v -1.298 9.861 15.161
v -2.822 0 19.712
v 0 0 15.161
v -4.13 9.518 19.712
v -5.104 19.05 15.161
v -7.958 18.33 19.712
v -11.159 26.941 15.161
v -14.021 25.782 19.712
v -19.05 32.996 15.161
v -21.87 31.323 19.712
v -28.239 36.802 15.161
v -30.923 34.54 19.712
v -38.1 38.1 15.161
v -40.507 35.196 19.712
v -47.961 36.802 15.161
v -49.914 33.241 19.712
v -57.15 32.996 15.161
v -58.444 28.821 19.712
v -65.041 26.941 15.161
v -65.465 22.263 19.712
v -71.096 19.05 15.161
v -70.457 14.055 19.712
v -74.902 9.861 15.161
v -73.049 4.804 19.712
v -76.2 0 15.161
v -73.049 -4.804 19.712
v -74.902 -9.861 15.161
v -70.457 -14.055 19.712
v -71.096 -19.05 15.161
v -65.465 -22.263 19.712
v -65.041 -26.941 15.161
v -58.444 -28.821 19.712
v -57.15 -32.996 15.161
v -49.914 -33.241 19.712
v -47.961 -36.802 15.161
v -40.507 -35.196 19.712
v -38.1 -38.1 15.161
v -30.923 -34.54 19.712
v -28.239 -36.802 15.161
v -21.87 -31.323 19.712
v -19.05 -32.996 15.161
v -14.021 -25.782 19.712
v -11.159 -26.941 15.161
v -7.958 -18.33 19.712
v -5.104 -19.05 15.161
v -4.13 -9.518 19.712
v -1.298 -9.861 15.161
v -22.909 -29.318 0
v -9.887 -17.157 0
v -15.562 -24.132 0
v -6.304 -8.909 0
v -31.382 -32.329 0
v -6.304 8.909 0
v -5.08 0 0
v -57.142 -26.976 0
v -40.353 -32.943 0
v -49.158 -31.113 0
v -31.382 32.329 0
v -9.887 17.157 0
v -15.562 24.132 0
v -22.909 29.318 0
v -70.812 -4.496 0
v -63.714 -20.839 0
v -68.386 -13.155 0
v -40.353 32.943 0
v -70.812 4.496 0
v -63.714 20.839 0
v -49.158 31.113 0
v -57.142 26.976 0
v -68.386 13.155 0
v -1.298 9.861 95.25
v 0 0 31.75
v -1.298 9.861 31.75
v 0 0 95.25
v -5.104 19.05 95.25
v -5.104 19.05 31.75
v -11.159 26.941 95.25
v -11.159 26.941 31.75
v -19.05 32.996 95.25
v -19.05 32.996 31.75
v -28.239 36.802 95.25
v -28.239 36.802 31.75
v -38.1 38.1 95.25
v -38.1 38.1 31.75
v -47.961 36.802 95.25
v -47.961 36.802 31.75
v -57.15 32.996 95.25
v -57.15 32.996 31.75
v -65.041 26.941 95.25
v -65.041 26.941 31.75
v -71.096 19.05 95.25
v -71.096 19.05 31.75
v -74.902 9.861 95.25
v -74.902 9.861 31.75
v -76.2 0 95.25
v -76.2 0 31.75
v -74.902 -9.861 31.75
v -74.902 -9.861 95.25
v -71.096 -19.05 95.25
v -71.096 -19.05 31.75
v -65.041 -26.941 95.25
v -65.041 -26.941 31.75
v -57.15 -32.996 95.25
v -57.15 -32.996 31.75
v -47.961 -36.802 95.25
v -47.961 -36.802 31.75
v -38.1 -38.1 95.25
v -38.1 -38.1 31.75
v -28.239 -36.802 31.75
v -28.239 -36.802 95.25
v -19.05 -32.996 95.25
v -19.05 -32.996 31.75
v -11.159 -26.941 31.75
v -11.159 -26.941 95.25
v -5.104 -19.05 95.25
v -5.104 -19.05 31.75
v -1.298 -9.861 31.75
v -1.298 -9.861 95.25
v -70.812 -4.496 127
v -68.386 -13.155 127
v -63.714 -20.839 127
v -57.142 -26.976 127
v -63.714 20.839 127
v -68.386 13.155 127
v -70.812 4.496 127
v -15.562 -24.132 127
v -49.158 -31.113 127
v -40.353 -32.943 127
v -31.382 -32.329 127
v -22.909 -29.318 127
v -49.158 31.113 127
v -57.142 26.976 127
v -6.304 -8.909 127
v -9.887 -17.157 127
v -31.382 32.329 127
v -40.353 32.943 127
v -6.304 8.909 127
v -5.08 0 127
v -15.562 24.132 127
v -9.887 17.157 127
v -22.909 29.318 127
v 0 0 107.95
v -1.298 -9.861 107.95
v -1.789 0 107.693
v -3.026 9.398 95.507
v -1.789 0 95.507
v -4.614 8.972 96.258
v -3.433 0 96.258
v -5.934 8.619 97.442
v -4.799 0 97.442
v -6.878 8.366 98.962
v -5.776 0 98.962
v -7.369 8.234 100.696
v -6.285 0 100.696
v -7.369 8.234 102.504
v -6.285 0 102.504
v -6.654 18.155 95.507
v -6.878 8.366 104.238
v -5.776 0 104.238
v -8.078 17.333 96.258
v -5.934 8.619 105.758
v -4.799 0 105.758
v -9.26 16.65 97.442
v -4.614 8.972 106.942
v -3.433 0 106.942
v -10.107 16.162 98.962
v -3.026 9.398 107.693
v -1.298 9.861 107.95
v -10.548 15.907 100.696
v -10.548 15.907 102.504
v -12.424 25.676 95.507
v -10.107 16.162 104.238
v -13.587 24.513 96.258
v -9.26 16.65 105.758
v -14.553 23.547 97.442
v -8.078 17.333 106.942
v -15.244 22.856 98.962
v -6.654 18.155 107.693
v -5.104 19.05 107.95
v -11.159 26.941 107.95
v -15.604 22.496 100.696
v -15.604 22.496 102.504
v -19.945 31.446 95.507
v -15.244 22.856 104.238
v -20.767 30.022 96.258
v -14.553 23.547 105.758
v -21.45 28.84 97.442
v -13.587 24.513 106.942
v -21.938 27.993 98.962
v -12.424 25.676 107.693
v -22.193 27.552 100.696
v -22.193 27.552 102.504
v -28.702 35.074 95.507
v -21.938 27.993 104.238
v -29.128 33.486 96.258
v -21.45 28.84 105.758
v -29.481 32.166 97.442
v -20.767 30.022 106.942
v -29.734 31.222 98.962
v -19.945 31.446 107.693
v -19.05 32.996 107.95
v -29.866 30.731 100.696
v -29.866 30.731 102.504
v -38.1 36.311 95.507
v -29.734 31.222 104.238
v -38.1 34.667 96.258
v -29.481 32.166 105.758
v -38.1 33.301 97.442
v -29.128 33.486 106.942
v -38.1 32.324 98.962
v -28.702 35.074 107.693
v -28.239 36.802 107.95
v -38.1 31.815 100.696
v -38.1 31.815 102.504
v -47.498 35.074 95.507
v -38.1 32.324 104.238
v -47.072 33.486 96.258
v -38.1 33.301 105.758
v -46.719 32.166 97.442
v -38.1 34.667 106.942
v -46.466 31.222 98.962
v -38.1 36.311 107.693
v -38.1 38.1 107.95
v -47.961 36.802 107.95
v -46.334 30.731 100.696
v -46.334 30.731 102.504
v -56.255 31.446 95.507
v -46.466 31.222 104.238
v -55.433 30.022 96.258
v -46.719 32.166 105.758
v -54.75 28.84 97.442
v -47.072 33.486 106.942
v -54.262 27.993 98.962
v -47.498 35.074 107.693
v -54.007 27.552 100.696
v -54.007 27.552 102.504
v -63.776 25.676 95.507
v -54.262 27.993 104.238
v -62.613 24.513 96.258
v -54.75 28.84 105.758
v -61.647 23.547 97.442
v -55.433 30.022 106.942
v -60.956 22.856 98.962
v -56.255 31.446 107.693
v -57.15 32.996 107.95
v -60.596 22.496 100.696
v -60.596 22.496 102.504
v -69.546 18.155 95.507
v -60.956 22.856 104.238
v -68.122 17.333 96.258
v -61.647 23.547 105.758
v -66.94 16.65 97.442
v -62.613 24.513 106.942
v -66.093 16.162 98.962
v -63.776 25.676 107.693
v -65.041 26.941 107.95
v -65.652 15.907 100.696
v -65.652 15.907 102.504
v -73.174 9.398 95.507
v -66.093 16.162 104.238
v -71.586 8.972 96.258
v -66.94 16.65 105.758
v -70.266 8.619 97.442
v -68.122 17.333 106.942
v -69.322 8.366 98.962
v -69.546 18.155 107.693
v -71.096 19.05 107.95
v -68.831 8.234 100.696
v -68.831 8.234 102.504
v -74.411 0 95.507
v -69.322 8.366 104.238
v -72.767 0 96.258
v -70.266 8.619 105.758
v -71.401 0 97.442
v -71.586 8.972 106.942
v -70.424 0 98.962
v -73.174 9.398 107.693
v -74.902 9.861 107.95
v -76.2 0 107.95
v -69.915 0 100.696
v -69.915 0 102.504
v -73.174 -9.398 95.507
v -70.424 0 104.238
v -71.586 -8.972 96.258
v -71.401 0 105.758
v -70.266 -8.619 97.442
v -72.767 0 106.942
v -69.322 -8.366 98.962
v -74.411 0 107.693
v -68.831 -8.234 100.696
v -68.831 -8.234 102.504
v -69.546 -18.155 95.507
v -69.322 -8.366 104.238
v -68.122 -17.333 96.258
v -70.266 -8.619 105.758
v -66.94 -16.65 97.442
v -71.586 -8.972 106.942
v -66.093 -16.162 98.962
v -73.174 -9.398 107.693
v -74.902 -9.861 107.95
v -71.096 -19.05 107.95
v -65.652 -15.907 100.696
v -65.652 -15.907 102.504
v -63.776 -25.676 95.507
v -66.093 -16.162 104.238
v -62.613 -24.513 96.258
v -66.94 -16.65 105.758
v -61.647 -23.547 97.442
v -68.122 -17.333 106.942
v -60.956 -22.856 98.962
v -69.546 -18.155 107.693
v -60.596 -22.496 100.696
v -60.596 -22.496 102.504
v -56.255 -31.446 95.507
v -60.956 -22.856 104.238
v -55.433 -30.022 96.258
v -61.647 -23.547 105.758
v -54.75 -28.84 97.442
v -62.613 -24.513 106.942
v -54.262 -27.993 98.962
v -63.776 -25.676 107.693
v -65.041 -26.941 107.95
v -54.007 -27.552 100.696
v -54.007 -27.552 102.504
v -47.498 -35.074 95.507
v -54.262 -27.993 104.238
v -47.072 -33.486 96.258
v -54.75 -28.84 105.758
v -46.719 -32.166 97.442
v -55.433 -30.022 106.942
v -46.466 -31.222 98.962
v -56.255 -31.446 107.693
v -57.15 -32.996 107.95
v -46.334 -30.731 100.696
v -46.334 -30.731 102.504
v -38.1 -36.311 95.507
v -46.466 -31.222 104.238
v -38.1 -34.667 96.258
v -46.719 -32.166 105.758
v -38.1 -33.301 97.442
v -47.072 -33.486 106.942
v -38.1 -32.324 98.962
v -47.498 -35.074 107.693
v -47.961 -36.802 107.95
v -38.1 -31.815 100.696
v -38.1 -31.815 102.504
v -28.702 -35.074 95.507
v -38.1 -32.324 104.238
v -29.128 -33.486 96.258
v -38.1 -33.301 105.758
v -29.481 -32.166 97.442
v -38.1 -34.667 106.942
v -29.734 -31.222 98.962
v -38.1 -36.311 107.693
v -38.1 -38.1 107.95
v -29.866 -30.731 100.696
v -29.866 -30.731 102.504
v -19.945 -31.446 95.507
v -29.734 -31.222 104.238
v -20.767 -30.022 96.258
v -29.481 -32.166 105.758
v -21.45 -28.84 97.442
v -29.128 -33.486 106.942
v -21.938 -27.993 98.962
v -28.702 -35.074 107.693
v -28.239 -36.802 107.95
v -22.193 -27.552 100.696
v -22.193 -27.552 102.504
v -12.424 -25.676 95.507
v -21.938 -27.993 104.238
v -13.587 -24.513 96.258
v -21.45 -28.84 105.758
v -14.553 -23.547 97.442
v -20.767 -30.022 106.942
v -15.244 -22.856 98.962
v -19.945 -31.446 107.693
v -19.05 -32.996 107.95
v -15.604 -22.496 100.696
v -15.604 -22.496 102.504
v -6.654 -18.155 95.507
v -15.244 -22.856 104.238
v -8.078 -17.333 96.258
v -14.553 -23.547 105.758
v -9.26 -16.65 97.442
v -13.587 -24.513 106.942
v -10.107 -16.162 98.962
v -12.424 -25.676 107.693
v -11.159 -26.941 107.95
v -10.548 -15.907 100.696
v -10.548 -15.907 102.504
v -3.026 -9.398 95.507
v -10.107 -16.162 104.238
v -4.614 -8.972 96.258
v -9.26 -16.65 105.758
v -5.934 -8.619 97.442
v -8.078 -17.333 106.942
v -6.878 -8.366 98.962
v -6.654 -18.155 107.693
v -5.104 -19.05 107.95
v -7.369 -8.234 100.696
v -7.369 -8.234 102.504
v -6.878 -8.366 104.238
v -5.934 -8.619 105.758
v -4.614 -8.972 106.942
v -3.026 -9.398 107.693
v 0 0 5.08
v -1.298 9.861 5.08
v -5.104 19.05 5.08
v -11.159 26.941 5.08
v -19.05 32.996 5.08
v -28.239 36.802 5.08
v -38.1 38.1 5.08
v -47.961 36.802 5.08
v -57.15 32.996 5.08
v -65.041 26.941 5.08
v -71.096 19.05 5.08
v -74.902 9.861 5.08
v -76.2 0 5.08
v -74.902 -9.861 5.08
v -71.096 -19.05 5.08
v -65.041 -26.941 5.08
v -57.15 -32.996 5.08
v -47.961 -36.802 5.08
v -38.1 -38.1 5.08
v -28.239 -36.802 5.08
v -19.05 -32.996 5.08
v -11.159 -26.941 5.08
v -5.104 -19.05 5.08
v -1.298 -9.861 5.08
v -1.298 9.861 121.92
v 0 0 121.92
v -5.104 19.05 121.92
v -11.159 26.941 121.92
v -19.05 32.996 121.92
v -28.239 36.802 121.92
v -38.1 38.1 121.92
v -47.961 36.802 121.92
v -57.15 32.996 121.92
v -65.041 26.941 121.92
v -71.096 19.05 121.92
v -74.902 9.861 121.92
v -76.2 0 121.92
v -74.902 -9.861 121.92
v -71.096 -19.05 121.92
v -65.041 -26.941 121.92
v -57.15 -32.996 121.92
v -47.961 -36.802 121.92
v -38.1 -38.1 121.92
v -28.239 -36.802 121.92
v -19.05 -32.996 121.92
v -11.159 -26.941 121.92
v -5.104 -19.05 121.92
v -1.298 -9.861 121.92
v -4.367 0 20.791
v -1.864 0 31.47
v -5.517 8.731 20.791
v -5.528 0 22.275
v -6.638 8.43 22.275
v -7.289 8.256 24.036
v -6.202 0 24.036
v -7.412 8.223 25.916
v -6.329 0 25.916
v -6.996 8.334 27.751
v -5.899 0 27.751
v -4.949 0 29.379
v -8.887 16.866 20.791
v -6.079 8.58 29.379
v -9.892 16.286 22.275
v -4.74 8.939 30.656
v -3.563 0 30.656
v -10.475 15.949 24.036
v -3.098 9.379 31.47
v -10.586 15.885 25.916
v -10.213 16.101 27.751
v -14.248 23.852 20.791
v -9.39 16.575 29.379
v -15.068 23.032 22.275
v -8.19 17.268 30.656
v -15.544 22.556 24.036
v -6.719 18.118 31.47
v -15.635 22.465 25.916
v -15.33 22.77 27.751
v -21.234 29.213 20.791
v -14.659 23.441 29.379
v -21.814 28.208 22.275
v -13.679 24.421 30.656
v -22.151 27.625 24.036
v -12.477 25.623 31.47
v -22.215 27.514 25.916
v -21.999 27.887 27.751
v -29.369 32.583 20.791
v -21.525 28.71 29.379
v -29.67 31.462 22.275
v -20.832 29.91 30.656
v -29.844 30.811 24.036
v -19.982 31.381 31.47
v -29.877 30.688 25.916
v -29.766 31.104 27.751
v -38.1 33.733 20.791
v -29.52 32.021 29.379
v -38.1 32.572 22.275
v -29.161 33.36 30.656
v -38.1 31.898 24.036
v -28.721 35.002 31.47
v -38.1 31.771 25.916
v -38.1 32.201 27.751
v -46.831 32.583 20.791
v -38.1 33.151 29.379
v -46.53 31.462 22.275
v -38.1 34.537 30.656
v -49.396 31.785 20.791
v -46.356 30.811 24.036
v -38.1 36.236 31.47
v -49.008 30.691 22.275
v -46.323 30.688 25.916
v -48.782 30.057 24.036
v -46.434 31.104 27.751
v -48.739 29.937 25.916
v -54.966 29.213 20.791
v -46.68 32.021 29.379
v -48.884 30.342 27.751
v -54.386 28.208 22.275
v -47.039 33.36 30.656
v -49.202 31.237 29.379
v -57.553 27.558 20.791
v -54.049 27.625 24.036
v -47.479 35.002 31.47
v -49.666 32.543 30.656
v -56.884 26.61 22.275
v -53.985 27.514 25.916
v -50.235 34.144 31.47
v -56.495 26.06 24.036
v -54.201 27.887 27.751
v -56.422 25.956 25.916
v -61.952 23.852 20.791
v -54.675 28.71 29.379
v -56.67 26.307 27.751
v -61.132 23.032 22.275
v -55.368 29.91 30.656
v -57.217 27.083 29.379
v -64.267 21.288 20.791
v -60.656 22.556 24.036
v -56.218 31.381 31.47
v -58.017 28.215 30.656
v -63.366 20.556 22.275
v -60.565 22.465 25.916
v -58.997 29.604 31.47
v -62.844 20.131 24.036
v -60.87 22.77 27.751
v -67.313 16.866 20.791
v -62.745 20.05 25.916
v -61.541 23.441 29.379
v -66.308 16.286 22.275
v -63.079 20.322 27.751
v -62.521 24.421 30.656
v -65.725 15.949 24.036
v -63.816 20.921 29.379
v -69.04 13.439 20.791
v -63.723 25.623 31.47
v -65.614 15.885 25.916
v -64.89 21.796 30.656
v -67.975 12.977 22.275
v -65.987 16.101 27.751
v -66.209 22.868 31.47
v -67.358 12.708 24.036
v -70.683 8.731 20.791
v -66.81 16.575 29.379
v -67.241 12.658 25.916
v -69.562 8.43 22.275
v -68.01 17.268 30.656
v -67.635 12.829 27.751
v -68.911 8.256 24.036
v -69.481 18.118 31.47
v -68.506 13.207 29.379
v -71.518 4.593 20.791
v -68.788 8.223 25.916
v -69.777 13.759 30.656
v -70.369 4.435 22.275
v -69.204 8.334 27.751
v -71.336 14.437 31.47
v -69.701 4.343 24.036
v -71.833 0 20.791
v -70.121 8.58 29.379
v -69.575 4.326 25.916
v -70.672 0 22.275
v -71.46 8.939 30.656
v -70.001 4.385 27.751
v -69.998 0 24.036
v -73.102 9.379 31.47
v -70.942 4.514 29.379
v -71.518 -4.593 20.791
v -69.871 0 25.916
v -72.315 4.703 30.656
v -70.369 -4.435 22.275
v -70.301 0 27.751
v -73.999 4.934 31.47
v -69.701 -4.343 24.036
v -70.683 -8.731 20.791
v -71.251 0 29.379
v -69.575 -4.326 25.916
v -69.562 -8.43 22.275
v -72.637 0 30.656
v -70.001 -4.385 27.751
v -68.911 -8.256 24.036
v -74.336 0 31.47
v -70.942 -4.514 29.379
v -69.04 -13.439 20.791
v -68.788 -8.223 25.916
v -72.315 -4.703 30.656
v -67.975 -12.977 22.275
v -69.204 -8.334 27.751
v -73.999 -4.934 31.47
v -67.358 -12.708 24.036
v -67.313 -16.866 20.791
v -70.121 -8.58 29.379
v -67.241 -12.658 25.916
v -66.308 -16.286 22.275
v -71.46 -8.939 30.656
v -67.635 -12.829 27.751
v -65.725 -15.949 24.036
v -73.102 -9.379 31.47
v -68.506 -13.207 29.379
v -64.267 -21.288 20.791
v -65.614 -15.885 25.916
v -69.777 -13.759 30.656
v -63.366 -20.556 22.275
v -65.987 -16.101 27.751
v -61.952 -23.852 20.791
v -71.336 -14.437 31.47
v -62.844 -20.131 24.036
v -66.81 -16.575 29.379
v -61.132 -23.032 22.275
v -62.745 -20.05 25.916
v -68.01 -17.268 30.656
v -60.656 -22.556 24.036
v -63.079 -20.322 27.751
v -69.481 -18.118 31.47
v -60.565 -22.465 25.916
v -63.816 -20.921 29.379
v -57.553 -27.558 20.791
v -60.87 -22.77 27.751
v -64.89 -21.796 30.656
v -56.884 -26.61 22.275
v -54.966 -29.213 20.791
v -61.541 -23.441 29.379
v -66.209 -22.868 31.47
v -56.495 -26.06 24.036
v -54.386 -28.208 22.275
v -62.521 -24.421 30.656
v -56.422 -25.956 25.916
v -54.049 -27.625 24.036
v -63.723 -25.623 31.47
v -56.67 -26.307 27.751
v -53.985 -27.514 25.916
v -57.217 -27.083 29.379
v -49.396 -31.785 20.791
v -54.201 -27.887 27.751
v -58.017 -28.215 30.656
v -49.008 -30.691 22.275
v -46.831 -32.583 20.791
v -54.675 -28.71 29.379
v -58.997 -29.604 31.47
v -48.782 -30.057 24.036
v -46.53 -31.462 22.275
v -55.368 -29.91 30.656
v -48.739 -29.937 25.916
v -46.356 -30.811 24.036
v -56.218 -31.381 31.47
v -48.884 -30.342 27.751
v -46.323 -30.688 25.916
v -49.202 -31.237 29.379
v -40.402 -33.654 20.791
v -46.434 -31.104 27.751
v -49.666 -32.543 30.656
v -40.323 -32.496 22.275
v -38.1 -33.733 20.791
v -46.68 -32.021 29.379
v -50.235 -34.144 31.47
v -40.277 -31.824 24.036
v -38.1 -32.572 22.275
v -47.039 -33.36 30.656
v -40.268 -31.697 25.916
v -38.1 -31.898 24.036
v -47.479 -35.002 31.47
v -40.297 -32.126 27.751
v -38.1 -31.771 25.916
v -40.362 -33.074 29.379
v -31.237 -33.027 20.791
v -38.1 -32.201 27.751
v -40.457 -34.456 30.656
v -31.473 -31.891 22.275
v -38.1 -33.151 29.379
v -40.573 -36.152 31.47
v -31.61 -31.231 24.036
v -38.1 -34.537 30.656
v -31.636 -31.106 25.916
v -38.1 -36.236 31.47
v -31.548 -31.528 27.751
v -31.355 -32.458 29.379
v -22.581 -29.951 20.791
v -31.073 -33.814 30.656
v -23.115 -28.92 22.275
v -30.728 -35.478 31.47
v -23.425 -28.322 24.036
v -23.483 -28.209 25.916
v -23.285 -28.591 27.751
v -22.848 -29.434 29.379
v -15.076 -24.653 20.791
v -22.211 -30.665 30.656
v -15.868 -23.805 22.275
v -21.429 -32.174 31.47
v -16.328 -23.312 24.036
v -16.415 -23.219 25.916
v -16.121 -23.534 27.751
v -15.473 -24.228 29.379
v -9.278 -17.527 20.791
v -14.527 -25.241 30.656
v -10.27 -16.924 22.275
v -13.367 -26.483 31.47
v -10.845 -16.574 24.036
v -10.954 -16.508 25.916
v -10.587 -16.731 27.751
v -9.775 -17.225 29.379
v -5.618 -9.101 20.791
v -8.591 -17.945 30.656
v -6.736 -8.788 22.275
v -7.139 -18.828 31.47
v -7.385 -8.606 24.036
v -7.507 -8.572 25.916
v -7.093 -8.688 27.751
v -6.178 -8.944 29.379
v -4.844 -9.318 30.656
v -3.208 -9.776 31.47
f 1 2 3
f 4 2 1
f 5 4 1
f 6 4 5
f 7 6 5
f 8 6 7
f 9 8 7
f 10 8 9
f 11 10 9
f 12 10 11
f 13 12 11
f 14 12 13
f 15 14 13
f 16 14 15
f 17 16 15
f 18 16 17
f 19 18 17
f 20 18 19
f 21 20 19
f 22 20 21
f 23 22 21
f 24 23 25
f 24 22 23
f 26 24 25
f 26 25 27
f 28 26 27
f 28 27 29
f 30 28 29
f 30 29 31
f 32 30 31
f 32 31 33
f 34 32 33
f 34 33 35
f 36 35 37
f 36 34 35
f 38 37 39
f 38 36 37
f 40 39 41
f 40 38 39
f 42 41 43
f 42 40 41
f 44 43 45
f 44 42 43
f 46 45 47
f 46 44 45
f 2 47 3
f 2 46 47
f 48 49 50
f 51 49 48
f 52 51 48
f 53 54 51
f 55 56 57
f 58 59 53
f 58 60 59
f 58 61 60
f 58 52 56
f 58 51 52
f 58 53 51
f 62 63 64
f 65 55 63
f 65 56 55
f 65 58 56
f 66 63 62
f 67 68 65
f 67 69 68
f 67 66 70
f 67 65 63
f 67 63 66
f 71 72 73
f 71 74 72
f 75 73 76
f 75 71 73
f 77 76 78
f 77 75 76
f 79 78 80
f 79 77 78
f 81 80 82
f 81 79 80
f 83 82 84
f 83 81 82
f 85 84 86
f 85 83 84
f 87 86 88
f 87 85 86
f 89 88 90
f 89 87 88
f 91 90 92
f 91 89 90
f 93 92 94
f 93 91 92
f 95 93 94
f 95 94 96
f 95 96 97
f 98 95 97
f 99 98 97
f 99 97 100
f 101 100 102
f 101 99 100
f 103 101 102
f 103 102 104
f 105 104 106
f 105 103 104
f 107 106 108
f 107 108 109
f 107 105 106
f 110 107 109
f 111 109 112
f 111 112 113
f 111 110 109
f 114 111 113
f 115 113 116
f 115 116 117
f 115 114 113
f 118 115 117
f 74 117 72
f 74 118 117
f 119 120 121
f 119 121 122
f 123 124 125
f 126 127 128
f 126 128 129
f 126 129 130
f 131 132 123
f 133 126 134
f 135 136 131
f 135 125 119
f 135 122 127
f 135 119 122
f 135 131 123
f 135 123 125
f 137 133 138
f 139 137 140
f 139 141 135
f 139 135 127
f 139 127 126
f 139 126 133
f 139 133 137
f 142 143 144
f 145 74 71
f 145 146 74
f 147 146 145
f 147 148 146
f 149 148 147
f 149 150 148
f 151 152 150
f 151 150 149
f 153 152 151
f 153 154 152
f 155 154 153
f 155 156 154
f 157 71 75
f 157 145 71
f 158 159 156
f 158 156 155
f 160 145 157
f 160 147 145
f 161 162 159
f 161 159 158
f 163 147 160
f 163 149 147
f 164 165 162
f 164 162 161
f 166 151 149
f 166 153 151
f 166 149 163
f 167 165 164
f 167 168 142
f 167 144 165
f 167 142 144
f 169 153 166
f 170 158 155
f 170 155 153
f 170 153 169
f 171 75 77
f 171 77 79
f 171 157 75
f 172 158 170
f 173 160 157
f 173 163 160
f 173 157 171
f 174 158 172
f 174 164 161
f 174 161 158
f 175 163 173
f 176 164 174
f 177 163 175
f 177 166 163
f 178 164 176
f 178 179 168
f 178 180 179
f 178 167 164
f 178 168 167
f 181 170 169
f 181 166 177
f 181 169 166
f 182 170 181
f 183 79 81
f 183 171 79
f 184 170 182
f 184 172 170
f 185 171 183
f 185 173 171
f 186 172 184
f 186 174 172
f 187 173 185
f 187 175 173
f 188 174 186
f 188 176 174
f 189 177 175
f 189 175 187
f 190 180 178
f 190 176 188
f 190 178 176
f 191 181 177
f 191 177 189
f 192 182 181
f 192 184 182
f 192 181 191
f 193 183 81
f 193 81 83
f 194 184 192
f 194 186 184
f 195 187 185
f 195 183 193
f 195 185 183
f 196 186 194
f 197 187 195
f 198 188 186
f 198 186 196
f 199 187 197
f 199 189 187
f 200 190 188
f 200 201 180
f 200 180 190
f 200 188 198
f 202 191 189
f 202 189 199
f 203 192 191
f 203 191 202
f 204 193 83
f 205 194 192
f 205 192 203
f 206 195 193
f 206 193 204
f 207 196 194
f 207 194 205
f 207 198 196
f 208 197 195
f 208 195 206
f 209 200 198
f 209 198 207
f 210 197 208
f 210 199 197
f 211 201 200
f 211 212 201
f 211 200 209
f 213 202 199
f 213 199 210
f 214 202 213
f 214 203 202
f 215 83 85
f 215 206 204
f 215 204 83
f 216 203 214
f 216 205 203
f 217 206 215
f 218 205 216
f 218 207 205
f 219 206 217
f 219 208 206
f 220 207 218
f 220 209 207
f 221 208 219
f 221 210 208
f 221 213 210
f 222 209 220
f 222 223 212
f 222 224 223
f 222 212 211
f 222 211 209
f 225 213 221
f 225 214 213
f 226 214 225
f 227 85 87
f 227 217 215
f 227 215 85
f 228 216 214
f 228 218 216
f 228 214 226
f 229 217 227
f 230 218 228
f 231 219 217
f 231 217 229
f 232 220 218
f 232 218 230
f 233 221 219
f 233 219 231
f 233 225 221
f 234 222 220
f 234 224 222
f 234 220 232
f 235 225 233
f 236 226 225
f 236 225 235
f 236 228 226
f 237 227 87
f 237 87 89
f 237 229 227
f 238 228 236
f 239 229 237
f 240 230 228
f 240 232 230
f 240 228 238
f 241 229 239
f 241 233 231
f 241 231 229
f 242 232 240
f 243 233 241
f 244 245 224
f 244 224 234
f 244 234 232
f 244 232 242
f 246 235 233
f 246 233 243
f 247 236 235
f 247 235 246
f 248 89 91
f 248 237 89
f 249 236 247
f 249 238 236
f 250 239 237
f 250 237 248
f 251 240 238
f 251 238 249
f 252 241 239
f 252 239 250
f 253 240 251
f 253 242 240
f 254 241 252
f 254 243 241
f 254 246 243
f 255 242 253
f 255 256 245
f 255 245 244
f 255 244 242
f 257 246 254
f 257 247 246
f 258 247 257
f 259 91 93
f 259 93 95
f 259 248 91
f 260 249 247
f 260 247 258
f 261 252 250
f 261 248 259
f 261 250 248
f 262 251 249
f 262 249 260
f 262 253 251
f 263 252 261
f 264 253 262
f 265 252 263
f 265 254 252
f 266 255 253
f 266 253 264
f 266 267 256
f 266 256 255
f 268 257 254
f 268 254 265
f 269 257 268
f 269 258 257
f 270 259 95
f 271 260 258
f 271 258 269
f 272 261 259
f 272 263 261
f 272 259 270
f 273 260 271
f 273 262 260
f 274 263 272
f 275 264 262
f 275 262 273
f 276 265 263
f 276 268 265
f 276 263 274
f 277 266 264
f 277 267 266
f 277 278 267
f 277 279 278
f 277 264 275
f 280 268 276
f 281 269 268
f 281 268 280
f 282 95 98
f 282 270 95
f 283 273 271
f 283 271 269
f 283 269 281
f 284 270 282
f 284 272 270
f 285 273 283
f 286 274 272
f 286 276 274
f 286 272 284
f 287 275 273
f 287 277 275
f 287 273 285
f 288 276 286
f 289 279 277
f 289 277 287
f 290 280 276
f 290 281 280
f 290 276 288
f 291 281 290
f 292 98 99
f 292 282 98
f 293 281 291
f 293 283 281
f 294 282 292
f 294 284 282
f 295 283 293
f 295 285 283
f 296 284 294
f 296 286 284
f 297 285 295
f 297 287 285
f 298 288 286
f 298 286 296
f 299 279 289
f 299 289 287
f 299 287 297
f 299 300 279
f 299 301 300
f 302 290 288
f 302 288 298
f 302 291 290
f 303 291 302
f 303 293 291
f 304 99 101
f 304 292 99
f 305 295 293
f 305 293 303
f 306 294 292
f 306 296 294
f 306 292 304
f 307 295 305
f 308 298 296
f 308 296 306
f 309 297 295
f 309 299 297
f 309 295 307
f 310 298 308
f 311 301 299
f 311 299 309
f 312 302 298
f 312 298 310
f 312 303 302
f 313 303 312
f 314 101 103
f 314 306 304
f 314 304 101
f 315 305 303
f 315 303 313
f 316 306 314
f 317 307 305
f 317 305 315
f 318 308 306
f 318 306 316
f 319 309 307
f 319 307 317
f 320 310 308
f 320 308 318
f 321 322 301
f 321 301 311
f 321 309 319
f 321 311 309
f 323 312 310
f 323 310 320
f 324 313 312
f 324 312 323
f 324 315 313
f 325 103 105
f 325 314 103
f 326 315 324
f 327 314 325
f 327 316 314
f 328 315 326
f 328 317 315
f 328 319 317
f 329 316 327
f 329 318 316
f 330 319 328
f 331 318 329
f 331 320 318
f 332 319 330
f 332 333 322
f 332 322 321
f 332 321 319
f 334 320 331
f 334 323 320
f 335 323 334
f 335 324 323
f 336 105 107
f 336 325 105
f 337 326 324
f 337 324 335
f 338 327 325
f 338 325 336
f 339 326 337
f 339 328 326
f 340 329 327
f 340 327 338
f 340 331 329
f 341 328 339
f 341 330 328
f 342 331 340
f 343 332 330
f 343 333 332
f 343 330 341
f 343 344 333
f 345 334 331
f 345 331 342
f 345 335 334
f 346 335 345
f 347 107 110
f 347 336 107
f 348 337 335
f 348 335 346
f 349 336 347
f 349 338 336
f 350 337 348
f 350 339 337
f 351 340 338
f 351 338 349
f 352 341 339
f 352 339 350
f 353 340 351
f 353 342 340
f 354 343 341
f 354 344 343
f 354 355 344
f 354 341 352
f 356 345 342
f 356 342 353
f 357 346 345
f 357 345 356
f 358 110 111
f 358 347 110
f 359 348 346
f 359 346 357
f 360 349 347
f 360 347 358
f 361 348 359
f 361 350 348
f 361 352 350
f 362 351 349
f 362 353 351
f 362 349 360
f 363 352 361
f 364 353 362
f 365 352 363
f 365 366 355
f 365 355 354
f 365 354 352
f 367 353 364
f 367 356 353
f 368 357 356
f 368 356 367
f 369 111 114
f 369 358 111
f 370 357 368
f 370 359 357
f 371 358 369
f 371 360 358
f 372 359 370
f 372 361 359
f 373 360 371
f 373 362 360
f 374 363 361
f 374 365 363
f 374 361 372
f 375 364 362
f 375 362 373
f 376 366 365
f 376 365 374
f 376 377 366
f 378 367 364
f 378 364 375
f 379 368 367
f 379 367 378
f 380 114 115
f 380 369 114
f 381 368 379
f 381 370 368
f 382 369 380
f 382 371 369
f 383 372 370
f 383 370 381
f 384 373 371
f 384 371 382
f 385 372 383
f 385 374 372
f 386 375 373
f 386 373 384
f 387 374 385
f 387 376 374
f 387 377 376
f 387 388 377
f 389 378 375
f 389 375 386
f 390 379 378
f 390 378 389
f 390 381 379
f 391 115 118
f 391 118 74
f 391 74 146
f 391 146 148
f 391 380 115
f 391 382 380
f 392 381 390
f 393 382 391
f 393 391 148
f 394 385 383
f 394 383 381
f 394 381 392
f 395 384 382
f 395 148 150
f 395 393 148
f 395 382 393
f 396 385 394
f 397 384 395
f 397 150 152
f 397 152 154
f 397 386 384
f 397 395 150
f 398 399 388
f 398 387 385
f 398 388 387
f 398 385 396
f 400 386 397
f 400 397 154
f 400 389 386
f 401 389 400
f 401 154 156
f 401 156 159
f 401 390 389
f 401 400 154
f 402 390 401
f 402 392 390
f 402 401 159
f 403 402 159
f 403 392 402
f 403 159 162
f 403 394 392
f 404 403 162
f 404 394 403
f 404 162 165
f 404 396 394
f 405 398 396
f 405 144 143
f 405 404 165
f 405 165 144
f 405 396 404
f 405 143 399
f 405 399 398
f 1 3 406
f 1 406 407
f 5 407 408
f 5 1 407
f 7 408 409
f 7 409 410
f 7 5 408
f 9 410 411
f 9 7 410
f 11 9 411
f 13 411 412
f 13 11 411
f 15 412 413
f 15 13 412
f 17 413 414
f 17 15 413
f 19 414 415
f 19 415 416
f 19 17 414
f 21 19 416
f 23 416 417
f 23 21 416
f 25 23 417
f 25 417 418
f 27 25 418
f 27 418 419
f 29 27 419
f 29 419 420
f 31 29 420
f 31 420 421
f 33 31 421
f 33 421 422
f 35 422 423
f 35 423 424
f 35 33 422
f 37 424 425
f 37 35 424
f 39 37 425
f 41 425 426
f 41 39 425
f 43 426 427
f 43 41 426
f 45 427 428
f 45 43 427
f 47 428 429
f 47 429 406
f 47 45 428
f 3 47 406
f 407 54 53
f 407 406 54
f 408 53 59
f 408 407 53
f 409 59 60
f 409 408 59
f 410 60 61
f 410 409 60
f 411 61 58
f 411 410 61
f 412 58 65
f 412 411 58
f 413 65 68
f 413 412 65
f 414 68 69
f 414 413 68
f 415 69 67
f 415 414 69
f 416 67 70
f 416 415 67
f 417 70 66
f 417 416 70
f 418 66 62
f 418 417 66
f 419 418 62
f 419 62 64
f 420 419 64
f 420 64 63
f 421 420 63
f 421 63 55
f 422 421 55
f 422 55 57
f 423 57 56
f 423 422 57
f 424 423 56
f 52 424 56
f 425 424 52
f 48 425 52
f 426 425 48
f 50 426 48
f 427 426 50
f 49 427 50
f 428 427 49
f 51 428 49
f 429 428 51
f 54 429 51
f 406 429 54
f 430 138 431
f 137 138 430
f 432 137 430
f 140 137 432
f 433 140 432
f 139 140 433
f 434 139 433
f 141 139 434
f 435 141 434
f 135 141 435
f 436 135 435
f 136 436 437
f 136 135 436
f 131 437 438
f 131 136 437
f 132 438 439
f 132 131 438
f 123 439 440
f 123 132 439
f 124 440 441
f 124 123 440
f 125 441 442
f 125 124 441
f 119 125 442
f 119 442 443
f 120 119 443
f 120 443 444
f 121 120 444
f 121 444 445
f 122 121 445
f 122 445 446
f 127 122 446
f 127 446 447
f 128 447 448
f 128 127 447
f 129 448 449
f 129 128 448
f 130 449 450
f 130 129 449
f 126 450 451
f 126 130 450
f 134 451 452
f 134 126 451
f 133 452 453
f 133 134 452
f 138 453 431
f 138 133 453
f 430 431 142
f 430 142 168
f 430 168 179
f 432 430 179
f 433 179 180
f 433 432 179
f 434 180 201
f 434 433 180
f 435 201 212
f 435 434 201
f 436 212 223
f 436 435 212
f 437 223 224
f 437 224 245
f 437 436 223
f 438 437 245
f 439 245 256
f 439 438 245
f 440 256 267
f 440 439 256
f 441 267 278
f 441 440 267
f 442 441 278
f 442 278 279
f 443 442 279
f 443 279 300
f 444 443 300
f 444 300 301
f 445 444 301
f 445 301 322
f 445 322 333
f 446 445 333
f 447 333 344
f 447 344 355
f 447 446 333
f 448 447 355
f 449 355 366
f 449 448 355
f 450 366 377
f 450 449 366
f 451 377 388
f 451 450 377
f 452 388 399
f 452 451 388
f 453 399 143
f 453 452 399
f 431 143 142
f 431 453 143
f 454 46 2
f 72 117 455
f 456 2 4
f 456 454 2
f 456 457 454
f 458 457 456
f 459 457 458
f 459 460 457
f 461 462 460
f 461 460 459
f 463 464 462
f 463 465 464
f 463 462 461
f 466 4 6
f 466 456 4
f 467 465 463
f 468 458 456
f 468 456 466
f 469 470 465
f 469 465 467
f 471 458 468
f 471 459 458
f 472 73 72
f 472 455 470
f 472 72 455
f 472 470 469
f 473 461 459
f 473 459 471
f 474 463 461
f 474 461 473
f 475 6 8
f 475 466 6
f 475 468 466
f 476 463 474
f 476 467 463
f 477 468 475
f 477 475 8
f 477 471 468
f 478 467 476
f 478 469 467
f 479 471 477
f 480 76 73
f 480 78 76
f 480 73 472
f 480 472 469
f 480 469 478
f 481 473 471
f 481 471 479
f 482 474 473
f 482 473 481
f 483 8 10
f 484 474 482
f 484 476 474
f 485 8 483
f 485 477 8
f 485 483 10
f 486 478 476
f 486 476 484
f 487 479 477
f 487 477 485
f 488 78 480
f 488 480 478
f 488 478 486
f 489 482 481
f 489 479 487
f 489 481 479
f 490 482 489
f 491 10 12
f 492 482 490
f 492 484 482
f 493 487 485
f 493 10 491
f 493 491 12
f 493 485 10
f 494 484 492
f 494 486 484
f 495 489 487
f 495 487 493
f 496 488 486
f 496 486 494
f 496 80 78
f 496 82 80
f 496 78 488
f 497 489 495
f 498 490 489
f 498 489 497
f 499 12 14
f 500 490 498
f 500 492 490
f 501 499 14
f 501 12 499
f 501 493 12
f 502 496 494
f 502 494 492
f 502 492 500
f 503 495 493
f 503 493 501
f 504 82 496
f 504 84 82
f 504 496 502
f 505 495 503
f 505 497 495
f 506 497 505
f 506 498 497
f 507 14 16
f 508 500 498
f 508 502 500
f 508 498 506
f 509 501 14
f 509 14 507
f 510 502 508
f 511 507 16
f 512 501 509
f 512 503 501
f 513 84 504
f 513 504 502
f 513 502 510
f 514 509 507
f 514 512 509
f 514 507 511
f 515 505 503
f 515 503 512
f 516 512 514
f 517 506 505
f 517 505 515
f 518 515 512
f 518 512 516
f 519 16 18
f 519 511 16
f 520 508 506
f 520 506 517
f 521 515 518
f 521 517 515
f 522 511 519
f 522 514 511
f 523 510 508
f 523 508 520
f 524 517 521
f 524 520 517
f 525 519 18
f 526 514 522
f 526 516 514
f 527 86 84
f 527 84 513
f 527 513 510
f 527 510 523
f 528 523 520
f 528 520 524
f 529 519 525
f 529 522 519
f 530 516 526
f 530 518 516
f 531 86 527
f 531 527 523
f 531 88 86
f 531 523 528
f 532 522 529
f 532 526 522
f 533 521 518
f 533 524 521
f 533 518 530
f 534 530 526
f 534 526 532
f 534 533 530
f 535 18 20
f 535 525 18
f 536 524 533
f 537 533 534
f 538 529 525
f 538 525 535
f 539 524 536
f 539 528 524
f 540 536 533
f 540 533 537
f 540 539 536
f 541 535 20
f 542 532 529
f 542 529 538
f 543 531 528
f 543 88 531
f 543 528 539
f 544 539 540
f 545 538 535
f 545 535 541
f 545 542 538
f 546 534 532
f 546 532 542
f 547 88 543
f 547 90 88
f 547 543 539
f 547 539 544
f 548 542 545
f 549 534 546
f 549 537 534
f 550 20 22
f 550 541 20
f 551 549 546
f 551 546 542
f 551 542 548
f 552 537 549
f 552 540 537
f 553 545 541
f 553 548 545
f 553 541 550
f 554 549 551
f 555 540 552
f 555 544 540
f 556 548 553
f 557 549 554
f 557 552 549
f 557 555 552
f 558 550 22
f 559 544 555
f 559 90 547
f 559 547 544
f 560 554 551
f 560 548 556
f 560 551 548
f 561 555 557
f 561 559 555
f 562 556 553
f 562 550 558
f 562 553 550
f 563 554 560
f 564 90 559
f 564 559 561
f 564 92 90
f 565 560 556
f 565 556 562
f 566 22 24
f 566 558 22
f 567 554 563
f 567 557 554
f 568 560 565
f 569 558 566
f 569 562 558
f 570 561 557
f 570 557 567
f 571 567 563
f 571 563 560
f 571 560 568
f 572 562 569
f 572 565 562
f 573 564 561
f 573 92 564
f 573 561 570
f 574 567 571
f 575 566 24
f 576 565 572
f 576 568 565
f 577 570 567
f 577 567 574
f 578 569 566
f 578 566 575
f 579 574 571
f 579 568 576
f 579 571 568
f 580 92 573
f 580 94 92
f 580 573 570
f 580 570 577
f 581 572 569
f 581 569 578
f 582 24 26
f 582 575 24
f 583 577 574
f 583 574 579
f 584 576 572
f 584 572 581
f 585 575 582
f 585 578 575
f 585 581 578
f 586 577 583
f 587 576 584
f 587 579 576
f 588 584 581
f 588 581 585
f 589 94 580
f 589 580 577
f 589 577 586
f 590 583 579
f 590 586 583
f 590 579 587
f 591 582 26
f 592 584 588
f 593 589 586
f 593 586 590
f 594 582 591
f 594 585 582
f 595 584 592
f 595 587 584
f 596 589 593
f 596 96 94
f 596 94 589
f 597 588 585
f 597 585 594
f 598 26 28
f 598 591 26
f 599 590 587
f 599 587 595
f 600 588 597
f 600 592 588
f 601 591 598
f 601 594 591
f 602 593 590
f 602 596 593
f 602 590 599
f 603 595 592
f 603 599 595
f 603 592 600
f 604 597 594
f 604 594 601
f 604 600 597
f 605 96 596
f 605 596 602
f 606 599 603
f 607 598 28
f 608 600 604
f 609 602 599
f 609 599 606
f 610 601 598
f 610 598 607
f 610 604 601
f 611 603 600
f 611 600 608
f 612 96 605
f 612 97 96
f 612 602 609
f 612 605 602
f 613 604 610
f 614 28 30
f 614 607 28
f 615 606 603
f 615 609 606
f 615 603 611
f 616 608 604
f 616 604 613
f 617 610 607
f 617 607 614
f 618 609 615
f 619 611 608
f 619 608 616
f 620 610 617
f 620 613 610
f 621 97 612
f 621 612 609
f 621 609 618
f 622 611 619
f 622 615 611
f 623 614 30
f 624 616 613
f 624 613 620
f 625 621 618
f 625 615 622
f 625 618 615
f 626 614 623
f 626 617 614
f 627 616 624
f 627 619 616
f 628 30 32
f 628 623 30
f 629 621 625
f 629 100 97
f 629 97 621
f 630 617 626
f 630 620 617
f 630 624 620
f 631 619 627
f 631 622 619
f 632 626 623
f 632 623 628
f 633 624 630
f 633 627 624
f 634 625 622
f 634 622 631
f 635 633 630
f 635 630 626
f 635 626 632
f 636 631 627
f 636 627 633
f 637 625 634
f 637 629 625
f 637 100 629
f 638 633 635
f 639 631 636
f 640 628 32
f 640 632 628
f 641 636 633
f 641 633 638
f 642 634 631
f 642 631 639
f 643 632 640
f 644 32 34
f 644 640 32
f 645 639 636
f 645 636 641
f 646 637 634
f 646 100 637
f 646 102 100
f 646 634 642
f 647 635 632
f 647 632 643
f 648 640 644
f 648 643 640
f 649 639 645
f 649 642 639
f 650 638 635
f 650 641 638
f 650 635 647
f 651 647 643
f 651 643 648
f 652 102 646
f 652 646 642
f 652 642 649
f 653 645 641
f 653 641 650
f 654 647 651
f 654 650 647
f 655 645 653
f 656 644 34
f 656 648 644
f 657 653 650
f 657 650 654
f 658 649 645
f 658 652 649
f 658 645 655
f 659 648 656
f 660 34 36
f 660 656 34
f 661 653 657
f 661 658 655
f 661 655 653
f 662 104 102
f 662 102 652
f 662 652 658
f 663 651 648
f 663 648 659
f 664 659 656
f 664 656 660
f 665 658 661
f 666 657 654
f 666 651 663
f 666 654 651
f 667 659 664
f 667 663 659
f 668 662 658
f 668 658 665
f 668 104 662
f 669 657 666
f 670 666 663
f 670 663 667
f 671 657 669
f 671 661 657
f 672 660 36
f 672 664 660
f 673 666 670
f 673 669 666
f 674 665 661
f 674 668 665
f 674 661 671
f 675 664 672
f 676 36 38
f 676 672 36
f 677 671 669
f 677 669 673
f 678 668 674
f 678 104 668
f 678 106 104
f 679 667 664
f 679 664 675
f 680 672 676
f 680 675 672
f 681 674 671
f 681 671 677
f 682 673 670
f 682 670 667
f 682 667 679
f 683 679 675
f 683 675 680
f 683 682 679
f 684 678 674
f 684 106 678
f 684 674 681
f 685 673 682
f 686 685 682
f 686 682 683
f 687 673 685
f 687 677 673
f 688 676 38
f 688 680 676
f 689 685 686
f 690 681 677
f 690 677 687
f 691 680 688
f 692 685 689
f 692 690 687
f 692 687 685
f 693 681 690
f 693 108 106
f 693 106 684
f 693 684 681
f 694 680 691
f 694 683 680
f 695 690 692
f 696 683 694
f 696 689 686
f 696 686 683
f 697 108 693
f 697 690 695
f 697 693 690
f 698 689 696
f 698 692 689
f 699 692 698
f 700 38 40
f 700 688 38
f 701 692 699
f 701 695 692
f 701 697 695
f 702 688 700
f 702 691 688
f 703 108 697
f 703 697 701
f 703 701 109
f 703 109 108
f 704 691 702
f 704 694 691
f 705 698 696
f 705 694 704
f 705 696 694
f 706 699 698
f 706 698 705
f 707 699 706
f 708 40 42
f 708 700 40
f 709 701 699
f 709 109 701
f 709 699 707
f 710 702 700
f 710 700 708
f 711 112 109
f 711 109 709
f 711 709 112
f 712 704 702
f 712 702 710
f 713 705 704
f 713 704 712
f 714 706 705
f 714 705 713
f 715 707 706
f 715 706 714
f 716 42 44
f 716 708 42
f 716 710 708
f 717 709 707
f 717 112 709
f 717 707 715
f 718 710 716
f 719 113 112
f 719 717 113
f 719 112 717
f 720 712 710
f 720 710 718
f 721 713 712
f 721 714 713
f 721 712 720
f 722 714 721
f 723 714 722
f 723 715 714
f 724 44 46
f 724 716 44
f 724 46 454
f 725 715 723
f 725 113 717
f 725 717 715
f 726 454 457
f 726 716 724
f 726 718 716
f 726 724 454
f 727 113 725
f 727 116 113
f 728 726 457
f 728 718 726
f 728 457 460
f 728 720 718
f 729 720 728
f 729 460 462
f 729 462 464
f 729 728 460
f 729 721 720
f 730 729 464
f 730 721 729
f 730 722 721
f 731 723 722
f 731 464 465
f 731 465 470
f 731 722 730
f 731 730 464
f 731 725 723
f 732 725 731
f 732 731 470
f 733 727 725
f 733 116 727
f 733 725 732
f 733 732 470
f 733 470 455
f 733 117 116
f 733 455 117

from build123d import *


# Not quite as in the source:
# - a fillet or chamfer that OpenCascade refuses, or shapes differently, is made with other operations: its cross-section is extruded or revolved along the edge and cut away or added


with BuildPart() as f1:
    # F0 (on Front) → F1 (revolve)
    with BuildSketch(Plane.XZ):
        with BuildLine():
            Line((-38.1, 0), (0, 0))
            Line((0, 0), (0, 19.05))
            ThreePointArc((0, 19.05), (-6.35, 25.4), (0, 31.75))
            Line((0, 31.75), (0, 95.25))
            ThreePointArc((0, 95.25), (-6.35, 101.6), (0, 107.95))
            Line((0, 107.95), (0, 127))
            Line((0, 127), (-38.1, 127))
            Line((-38.1, 127), (-38.1, 0))
        make_face()
    revolve(axis=Axis((-38.1, 0, 63.5), (0, 0, 1)))

    # F2: chamfer of 5.08 on 4 edges, made by hand

    # F2_s1 → F2_t2 (revolve, cut)
    with BuildSketch(Plane.XZ):
        Polygon((0, 121.92), (-5.08, 127), (0, 127), align=None)
    revolve(axis=Axis((-38.1, 0, 127), (0, 0, 1)), mode=Mode.SUBTRACT)

    # F2_s3 → F2_t4 (revolve, cut)
    with BuildSketch(Plane.XZ):
        Polygon((-5.08, 0), (0, 5.08), (0, 0), align=None)
    revolve(axis=Axis((-38.1, 0, 0), (0, 0, 1)), mode=Mode.SUBTRACT)

    # F2_s5 → F2_t6 (revolve, cut)
    with BuildSketch(Plane.XZ):
        with BuildLine():
            Line((0, 15.1609326597), (-2.8222222222, 19.7116292554))
            ThreePointArc((-2.8222222222, 19.7116292554), (-1.5219513398, 19.2350860412), (0, 19.05))
            Line((0, 19.05), (0, 15.1609326597))
        make_face()
    revolve(axis=Axis((-38.1, 0, 19.05), (0, 0, 1)), mode=Mode.SUBTRACT)


solid = f1.part
